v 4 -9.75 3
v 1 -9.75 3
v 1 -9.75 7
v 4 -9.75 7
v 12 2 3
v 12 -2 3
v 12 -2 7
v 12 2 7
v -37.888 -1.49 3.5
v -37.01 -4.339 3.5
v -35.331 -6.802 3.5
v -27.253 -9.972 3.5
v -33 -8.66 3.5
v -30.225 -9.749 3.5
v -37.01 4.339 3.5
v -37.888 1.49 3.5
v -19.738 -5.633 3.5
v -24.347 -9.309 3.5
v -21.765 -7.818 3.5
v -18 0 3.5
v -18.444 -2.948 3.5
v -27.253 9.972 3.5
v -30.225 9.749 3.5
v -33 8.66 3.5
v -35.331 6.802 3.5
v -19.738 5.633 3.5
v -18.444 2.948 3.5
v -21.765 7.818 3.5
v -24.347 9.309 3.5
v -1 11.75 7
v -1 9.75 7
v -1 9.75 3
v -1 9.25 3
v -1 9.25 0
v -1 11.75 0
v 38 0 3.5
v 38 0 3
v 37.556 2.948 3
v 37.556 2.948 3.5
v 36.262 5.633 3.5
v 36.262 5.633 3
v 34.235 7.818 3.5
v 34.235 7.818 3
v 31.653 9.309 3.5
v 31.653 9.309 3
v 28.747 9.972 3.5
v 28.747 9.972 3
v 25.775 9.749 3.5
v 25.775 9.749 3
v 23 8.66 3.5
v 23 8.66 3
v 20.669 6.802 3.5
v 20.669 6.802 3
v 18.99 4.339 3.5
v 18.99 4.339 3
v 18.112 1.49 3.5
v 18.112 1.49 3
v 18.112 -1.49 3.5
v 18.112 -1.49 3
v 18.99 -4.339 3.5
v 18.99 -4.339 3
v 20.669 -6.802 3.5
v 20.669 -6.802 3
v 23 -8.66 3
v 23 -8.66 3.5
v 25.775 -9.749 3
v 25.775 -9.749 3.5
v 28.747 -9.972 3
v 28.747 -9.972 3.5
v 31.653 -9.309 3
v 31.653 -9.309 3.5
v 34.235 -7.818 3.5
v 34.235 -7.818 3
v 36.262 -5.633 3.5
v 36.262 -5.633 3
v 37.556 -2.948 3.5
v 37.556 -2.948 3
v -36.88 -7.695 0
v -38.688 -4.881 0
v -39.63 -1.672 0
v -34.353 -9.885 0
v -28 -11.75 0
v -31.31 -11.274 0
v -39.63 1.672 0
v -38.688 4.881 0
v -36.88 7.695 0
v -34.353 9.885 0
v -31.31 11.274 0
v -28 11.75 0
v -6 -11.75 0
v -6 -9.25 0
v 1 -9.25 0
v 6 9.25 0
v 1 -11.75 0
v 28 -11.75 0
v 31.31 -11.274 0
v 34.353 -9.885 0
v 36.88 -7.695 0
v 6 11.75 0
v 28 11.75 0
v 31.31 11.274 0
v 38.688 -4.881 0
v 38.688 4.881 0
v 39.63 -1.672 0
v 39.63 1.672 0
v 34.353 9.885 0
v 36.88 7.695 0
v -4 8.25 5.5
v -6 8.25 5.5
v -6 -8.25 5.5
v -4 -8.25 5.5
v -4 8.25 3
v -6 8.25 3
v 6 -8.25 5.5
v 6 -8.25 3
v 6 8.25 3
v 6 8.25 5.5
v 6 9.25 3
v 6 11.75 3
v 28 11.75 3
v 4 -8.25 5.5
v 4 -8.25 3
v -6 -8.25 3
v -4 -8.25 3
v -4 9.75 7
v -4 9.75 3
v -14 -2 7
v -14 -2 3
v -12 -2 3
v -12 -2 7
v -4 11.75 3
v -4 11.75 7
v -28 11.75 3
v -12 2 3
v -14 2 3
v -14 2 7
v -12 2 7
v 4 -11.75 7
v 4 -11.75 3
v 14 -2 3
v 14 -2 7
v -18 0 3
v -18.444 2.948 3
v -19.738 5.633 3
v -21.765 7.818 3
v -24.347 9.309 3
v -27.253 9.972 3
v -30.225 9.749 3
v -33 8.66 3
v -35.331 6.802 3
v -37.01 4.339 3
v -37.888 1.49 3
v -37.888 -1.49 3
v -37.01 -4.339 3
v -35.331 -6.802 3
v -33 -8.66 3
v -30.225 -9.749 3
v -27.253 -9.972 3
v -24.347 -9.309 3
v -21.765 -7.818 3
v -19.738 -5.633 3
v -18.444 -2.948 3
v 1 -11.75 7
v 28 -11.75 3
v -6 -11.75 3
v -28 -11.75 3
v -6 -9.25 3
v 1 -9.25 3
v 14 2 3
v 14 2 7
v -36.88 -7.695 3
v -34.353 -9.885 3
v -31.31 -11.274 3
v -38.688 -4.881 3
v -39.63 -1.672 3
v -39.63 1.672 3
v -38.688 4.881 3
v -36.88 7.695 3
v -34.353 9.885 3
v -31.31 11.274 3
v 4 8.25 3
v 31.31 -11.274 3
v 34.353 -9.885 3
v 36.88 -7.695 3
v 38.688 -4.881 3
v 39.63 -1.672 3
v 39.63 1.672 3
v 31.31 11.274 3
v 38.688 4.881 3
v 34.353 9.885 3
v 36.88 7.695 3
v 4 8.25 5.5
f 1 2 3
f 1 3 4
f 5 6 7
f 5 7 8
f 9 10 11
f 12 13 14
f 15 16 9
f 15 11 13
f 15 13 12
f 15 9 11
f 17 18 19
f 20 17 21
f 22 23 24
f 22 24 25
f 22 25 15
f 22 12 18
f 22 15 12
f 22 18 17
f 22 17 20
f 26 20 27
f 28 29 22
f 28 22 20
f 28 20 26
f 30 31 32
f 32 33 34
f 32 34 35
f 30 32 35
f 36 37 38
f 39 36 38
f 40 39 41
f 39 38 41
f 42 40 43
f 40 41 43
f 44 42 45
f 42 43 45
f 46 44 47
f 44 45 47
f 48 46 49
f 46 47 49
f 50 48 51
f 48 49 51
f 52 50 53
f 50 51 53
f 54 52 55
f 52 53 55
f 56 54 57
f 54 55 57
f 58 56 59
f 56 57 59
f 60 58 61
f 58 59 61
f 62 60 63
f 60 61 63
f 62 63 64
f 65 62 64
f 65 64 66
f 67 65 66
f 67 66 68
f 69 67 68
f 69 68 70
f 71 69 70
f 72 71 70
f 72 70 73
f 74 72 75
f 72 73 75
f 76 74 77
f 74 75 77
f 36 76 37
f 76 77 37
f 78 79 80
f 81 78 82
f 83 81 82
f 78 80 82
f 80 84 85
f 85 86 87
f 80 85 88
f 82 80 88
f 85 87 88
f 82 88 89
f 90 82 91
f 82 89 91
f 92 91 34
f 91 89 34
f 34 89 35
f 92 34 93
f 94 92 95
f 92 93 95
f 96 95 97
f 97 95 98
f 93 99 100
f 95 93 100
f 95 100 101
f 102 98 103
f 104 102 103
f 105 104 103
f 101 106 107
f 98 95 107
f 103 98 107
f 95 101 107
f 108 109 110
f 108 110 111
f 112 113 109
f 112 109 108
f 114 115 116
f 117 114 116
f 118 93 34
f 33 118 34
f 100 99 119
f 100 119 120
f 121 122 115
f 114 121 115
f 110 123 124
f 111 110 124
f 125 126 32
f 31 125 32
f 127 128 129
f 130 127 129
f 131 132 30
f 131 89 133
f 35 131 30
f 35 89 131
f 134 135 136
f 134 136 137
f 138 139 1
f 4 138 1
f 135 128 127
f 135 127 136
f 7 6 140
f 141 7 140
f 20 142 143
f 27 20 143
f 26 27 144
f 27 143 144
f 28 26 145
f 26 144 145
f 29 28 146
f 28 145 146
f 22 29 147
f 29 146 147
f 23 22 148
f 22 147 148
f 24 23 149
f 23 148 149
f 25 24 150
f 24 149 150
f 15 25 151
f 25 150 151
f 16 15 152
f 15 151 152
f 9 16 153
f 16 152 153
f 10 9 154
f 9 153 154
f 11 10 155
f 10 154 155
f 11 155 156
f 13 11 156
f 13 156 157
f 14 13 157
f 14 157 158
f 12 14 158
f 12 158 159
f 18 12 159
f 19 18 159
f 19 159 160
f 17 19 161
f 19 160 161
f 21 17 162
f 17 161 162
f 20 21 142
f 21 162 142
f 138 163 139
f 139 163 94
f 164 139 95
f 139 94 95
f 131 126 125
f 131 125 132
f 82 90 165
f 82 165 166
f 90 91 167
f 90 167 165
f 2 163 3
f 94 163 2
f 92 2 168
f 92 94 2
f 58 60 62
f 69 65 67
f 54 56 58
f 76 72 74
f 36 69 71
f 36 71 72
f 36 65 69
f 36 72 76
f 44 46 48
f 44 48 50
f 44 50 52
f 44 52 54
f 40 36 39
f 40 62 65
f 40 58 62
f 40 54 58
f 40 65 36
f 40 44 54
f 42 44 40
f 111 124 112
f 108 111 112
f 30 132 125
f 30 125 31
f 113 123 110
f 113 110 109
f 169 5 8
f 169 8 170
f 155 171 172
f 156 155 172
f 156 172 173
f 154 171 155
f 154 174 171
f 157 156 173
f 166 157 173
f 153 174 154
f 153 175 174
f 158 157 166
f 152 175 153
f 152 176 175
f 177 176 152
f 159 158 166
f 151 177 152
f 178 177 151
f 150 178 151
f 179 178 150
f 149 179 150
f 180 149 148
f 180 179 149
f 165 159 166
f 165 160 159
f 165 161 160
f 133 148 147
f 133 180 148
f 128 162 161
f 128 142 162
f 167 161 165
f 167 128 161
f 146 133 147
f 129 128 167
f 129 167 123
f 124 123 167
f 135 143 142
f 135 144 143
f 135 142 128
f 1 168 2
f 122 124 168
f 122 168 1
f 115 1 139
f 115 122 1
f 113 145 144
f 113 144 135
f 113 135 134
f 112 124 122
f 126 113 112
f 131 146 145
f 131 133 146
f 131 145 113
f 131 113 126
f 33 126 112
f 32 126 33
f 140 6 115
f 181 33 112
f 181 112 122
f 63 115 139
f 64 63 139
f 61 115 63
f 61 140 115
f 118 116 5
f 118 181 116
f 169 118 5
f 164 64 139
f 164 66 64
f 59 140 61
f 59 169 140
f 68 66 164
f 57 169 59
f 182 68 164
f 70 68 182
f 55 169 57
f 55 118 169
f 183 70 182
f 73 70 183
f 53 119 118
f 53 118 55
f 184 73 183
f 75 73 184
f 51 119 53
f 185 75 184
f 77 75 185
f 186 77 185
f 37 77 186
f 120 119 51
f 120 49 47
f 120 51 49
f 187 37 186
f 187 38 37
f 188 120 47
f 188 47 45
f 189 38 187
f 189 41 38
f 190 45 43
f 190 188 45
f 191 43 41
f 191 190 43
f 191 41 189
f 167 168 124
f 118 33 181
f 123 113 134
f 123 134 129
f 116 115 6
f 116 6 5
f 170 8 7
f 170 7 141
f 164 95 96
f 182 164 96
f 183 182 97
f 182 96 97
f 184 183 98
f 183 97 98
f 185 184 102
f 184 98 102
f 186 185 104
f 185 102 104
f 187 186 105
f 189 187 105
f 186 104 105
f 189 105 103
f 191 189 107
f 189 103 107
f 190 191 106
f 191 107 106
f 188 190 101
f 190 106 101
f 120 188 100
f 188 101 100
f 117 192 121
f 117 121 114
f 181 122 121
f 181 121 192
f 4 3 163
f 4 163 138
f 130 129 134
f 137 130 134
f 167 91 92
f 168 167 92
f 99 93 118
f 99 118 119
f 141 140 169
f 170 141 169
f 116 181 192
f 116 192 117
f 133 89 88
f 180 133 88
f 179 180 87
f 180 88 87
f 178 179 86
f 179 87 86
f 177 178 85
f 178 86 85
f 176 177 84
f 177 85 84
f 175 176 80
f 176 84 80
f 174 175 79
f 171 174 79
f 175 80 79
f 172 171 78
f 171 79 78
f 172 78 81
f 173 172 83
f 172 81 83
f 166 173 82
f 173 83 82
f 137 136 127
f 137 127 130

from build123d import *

# Parameters (mm, degrees)
PAD_DEPTH     = 3
SKETCH001_W   = 2
SKETCH001_H   = 16.5
PAD001_DEPTH  = 2.5
SKETCH002_W   = 2
SKETCH002_H   = 4
SKETCH002_W_2 = 3
SKETCH002_H_2 = 2
PAD002_DEPTH  = 4
SKETCH003_R   = 10
PAD003_DEPTH  = 0.5


with BuildPart() as part:
    # Sketch → Pad (new body)
    with BuildSketch(Plane.XY):
        with BuildLine():
            Line((-6, -9.25), (1, -9.25))
            Line((1, -11.75), (1, -9.25))
            Line((1, -11.75), (27.999978, -11.75))
            ThreePointArc((27.999978, -11.75), (39.749978, -1.2e-05), (28.000001, 11.75))
            Line((6, 11.75), (28.000001, 11.75))
            Line((6, 9.25), (6, 11.75))
            Line((6, 9.25), (-1, 9.25))
            Line((-1, 9.25), (-1, 11.75))
            Line((-1, 11.75), (-27.999999, 11.75))
            ThreePointArc((-27.999999, 11.75), (-39.749976, 1e-06), (-28.000001, -11.75))
            Line((-6, -11.75), (-28.000001, -11.75))
            Line((-6, -9.25), (-6, -11.75))
        make_face()
    extrude(amount=PAD_DEPTH)

    # Sketch001 (on Face14 of Pad) → Pad001 (join)
    with BuildSketch(Plane.XY.offset(3)):
        with Locations((-5, 0)):
            Rectangle(SKETCH001_W, SKETCH001_H)
        with Locations((5, 0)):
            Rectangle(SKETCH001_W, SKETCH001_H)
    extrude(amount=PAD001_DEPTH)

    # Sketch002 (on Face5 of Pad001) → Pad002 (join)
    with BuildSketch(Plane.XY.offset(3)):
        with Locations((-13, 0)):
            Rectangle(SKETCH002_W, SKETCH002_H)
        with Locations((13, 0)):
            Rectangle(SKETCH002_W, SKETCH002_H)
        with Locations((-2.5, 10.75)):
            Rectangle(SKETCH002_W_2, SKETCH002_H_2)
        with Locations((2.5, -10.75)):
            Rectangle(SKETCH002_W_2, SKETCH002_H_2)
    extrude(amount=PAD002_DEPTH)

    # Sketch003 (on Face5 of Pad002) → Pad003 (join)
    with BuildSketch(Plane.XY.offset(3)):
        with Locations((-28, 0)):
            Circle(SKETCH003_R)
        with Locations((28, 0)):
            Circle(SKETCH003_R)
    extrude(amount=PAD003_DEPTH)


solid = part.part
